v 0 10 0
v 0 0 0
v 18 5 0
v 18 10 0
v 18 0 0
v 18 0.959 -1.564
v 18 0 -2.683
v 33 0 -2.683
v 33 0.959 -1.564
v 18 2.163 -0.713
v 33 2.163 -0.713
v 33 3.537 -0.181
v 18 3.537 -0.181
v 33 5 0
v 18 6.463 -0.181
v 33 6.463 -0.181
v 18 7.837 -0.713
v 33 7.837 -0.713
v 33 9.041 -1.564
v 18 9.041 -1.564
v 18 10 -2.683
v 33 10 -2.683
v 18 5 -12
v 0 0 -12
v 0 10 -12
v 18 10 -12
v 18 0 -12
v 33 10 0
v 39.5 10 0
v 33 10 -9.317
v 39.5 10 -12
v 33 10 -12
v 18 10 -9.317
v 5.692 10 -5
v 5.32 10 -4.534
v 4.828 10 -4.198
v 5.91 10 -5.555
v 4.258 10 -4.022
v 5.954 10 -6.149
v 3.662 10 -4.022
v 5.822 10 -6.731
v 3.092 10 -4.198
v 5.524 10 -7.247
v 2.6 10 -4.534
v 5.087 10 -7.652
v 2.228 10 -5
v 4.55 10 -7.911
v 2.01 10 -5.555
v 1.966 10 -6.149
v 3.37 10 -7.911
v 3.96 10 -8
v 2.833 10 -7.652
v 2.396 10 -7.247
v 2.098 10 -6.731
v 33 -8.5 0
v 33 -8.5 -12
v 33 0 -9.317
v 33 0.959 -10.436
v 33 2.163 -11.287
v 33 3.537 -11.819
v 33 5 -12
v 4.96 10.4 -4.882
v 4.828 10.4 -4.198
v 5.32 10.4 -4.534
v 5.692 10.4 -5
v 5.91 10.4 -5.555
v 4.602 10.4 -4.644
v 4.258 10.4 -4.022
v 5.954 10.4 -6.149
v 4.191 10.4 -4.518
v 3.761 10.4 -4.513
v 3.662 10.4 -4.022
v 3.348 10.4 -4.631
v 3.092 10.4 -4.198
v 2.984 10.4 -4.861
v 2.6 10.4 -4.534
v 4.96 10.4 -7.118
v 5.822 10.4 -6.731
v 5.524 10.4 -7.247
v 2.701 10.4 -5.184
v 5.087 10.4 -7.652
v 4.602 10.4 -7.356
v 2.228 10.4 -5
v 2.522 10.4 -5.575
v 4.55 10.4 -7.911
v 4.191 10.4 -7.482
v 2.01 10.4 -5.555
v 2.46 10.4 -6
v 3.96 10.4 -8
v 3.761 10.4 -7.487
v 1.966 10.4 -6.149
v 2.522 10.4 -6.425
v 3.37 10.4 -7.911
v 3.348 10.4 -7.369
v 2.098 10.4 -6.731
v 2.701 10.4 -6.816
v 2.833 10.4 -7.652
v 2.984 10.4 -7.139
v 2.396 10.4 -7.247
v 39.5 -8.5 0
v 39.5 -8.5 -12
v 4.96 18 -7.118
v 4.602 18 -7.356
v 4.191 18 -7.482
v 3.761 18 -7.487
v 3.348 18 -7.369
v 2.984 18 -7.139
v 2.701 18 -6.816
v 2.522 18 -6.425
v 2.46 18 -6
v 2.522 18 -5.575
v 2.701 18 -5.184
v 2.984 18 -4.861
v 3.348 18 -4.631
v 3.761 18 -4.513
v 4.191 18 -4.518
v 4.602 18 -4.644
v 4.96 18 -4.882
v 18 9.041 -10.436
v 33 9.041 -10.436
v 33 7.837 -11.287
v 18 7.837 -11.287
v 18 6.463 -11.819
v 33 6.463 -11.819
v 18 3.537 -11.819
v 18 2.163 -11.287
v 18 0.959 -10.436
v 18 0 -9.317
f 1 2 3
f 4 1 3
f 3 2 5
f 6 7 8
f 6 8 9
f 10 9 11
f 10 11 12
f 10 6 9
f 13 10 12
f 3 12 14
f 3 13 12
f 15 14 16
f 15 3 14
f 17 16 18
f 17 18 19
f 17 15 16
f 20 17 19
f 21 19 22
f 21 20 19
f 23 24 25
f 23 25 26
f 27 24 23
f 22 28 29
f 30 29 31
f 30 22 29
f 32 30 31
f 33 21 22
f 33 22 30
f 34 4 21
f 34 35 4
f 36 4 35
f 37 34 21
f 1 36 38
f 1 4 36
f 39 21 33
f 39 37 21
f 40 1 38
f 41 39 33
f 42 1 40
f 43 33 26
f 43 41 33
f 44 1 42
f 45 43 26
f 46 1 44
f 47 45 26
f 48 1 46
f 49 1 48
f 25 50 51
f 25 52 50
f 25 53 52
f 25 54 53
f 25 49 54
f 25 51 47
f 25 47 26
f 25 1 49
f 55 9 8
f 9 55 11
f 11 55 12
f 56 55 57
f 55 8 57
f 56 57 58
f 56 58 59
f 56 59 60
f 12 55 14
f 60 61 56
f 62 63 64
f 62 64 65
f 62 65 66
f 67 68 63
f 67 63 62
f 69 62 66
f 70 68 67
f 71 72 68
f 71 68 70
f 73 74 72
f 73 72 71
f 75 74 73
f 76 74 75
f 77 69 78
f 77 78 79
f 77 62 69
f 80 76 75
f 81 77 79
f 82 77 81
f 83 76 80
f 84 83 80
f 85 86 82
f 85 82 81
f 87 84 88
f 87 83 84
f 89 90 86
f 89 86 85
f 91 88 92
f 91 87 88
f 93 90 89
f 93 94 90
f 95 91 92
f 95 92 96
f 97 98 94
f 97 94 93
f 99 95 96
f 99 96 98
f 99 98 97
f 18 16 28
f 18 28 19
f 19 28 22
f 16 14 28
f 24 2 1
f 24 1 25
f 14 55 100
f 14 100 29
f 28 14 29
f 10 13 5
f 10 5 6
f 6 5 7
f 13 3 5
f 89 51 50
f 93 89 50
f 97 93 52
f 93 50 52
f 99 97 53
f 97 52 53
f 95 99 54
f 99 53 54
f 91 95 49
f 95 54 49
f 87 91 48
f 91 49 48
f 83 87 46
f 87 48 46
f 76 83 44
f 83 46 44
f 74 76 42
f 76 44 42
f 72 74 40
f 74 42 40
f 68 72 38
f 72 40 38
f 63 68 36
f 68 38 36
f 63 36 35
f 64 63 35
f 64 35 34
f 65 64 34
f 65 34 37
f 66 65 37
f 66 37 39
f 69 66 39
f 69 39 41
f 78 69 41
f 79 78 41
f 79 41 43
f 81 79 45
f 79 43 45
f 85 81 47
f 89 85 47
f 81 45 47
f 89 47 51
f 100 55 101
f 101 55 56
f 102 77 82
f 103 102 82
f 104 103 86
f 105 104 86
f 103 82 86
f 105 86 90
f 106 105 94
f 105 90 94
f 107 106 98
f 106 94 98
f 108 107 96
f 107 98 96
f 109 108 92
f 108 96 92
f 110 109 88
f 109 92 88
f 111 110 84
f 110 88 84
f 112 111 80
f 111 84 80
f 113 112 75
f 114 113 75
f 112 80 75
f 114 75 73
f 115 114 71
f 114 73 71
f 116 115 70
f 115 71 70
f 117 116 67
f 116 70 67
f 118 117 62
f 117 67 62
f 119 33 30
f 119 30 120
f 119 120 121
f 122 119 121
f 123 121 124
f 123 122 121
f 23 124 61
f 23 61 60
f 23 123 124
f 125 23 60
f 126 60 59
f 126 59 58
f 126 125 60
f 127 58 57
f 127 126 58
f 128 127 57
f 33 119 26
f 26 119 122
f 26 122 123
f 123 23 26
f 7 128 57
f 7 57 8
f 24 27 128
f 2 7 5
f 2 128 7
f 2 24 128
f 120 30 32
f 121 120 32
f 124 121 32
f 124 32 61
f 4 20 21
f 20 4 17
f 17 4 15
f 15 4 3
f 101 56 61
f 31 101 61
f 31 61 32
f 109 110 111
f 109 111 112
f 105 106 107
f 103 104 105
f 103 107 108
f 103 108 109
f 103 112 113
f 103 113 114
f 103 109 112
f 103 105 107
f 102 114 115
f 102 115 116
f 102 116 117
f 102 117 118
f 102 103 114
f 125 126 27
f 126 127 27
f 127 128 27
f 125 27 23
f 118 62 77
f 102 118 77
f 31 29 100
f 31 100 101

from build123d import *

# Parameters (mm, degrees)
SKETCH_1_W      = 18
SKETCH_1_H      = 12
EXTRUDE_1_DEPTH = 10
EXTRUDE_2_DEPTH = 15
SKETCH_3_R      = 2
EXTRUDE_3_DEPTH = 0.4
EXTRUDE_5_DEPTH = 7.6
SKETCH_5_W      = 12
SKETCH_5_H      = 18.5
EXTRUDE_6_DEPTH = 6.5


with BuildPart() as part:
    # 草图1 → 凸台-拉伸1 (new body)
    with BuildSketch(Plane(origin=(0, 0, 0), x_dir=(1, 0, 0), z_dir=(0, 1, 0))):
        with Locations((9, 6)):
            Rectangle(SKETCH_1_W, SKETCH_1_H)
    extrude(amount=EXTRUDE_1_DEPTH)

    # 草图2 → 凸台-拉伸2 (add)
    with BuildSketch(Plane(origin=(18, 0, 0), x_dir=(0, 0, -1), z_dir=(1, 0, 0))):
        with BuildLine():
            Line((2.68337521, 10), (9.31662479, 10))
            ThreePointArc((9.31662479, 10), (12, 5), (9.31662479, 0))
            Line((9.31662479, 0), (2.68337521, 0))
            ThreePointArc((2.68337521, 0), (0, 5), (2.68337521, 10))
        make_face()
    extrude(amount=EXTRUDE_2_DEPTH)

    # 草图3 → 凸台-拉伸3 (add)
    with BuildSketch(Plane(origin=(0, 10, 0), x_dir=(1, 0, 0), z_dir=(0, 1, 0))):
        with Locations(Location((3.96, 6, 0), (0, 0, 90))):
            Circle(SKETCH_3_R)
    extrude(amount=EXTRUDE_3_DEPTH)

    # 草图4 → 凸台-拉伸5 (add)
    with BuildSketch(Plane(origin=(0, 10.4, 0), x_dir=(1, 0, 0), z_dir=(0, 1, 0))):
        with BuildLine():
            Line((4.96, 4.881966011), (4.96, 7.118033989))
            ThreePointArc((4.96, 7.118033989), (2.46, 6), (4.96, 4.881966011))
        make_face()
    extrude(amount=EXTRUDE_5_DEPTH)

    # 草图5 → 凸台-拉伸6 (add)
    with BuildSketch(Plane(origin=(33, 0, 0), x_dir=(0, 0, -1), z_dir=(1, 0, 0))):
        with Locations((6, 0.75)):
            Rectangle(SKETCH_5_W, SKETCH_5_H)
    extrude(amount=EXTRUDE_6_DEPTH)


solid = part.part
